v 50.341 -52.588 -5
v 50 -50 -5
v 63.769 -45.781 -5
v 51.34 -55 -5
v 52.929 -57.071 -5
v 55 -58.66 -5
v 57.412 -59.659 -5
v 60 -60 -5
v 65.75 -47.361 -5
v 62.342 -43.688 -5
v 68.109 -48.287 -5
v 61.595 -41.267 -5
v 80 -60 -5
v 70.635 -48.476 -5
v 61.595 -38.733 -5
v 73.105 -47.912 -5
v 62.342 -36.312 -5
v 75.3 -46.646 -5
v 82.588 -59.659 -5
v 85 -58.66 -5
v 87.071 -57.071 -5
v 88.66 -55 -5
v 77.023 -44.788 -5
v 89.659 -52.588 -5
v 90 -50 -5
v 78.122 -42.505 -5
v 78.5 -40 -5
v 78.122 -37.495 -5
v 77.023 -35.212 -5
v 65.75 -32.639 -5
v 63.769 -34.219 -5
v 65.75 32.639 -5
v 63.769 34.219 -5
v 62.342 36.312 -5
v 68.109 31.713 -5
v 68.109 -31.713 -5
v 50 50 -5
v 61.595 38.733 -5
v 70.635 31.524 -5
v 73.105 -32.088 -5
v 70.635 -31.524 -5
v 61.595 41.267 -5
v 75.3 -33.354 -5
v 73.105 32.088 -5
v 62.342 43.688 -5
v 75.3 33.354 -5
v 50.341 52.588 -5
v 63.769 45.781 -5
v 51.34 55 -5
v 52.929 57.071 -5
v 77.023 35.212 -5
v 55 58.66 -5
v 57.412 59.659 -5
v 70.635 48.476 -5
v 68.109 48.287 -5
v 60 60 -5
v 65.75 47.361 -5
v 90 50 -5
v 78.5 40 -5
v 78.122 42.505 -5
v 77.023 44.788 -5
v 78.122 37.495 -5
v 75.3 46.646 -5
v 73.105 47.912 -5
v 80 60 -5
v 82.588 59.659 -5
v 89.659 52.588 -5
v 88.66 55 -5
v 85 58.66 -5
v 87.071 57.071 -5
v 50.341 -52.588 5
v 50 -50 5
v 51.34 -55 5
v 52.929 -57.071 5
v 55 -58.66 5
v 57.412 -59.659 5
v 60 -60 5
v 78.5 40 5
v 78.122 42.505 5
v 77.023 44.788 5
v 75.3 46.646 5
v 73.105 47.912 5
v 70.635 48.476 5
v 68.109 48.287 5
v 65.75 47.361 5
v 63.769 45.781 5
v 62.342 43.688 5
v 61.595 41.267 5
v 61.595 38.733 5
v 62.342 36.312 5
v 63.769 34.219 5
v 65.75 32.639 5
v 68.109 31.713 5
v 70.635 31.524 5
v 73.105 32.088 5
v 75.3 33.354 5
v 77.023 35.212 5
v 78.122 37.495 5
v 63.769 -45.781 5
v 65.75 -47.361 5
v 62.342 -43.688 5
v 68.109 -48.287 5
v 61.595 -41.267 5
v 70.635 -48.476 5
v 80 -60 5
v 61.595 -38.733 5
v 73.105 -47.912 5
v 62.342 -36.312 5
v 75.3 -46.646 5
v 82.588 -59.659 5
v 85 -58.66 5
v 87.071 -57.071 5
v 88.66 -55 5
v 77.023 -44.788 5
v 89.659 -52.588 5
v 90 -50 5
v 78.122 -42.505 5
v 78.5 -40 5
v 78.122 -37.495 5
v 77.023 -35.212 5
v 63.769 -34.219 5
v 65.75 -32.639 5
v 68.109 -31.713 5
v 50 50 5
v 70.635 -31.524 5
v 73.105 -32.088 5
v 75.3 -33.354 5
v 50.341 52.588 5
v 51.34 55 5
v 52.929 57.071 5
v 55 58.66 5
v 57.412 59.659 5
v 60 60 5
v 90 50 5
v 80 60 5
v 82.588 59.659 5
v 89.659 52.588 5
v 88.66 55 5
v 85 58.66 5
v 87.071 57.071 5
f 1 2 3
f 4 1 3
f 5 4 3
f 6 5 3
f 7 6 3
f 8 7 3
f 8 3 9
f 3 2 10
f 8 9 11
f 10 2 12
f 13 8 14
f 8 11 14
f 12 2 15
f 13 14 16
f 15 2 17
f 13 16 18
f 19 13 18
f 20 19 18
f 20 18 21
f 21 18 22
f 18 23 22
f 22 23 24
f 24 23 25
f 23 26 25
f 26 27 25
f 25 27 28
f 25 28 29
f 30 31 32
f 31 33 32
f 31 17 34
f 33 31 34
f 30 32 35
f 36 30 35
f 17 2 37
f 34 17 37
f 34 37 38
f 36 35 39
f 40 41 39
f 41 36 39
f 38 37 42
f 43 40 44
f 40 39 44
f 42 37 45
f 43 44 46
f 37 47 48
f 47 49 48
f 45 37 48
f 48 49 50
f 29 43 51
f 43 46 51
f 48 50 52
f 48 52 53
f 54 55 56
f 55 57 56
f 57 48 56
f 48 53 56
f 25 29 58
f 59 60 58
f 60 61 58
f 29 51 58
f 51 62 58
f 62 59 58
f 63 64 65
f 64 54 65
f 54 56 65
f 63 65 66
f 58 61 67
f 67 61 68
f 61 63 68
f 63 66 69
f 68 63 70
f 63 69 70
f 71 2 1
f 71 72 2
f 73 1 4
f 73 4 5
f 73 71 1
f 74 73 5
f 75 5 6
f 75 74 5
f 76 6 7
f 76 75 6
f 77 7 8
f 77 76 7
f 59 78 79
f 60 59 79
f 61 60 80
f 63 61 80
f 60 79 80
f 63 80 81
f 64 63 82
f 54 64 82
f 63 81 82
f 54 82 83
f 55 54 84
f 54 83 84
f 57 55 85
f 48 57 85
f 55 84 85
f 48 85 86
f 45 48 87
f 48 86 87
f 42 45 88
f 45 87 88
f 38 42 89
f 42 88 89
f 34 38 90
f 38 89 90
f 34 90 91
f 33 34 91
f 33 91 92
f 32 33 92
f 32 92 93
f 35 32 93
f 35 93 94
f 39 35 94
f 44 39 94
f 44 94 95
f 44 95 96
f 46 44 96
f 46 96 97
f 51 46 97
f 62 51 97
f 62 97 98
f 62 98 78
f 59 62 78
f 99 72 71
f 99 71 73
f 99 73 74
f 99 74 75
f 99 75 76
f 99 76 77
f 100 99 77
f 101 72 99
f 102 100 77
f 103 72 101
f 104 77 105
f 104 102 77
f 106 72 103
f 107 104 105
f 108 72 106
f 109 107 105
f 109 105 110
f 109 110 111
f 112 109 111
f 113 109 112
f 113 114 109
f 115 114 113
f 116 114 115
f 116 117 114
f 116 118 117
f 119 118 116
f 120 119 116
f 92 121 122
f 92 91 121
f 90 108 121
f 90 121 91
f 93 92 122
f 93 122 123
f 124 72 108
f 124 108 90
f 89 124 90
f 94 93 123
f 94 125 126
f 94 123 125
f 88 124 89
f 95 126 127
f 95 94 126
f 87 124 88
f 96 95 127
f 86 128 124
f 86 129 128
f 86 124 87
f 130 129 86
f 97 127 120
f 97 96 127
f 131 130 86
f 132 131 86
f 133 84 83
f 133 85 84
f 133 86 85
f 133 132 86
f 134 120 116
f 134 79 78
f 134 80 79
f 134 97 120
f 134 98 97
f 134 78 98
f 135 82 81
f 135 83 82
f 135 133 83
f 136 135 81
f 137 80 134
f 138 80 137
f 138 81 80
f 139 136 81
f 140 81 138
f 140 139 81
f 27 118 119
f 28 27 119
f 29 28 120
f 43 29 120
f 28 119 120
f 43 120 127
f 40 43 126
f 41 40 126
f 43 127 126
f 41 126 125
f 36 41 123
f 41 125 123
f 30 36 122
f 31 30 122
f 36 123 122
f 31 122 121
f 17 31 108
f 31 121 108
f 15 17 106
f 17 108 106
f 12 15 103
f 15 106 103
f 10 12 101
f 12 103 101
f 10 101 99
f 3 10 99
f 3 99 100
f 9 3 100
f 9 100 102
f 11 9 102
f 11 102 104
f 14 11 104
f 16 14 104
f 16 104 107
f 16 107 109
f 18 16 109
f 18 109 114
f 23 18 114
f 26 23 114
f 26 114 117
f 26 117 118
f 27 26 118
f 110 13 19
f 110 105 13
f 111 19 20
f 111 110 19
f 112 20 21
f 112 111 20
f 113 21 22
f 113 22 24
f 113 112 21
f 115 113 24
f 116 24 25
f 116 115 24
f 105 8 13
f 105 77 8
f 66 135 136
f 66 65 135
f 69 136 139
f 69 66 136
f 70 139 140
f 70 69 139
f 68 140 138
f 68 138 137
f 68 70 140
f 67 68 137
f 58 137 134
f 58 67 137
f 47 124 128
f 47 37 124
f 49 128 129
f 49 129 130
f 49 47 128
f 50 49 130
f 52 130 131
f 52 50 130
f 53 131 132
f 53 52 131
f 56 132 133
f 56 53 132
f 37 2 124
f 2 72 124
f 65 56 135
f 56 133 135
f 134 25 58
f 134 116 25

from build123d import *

# Parameters (mm, degrees)
ESQUISSE1_W             = 40
ESQUISSE1_H             = 120
BOSS_EXTRU_1_DEPTH      = 5
ESQUISSE2_R             = 8.5
ENL_V_MAT_EXTRU_1_DEPTH = 11
CONG_1_R                = 10


with BuildPart() as part:
    # Esquisse1 → Boss.-Extru.1 (new body, symmetric)
    with BuildSketch(Plane.XY):
        with Locations((70, 0)):
            Rectangle(ESQUISSE1_W, ESQUISSE1_H)
    extrude(amount=BOSS_EXTRU_1_DEPTH, both=True)

    # Esquisse2 → Enlèv. mat.-Extru.1 (cut, through all)
    with BuildSketch(Plane.XY.offset(5)):
        with Locations((70, 40)):
            Circle(ESQUISSE2_R)
        with Locations((70, -40)):
            Circle(ESQUISSE2_R)
    extrude(amount=-ENL_V_MAT_EXTRU_1_DEPTH, mode=Mode.SUBTRACT)

    # Congé1
    cong_1_edges = [part.edges().sort_by_distance(p)[0] for p in [
        (50, 60, 0),
        (90, 60, 0),
        (90, -60, 0),
        (50, -60, 0),
    ]]
    fillet(cong_1_edges, radius=CONG_1_R)


solid = part.part
